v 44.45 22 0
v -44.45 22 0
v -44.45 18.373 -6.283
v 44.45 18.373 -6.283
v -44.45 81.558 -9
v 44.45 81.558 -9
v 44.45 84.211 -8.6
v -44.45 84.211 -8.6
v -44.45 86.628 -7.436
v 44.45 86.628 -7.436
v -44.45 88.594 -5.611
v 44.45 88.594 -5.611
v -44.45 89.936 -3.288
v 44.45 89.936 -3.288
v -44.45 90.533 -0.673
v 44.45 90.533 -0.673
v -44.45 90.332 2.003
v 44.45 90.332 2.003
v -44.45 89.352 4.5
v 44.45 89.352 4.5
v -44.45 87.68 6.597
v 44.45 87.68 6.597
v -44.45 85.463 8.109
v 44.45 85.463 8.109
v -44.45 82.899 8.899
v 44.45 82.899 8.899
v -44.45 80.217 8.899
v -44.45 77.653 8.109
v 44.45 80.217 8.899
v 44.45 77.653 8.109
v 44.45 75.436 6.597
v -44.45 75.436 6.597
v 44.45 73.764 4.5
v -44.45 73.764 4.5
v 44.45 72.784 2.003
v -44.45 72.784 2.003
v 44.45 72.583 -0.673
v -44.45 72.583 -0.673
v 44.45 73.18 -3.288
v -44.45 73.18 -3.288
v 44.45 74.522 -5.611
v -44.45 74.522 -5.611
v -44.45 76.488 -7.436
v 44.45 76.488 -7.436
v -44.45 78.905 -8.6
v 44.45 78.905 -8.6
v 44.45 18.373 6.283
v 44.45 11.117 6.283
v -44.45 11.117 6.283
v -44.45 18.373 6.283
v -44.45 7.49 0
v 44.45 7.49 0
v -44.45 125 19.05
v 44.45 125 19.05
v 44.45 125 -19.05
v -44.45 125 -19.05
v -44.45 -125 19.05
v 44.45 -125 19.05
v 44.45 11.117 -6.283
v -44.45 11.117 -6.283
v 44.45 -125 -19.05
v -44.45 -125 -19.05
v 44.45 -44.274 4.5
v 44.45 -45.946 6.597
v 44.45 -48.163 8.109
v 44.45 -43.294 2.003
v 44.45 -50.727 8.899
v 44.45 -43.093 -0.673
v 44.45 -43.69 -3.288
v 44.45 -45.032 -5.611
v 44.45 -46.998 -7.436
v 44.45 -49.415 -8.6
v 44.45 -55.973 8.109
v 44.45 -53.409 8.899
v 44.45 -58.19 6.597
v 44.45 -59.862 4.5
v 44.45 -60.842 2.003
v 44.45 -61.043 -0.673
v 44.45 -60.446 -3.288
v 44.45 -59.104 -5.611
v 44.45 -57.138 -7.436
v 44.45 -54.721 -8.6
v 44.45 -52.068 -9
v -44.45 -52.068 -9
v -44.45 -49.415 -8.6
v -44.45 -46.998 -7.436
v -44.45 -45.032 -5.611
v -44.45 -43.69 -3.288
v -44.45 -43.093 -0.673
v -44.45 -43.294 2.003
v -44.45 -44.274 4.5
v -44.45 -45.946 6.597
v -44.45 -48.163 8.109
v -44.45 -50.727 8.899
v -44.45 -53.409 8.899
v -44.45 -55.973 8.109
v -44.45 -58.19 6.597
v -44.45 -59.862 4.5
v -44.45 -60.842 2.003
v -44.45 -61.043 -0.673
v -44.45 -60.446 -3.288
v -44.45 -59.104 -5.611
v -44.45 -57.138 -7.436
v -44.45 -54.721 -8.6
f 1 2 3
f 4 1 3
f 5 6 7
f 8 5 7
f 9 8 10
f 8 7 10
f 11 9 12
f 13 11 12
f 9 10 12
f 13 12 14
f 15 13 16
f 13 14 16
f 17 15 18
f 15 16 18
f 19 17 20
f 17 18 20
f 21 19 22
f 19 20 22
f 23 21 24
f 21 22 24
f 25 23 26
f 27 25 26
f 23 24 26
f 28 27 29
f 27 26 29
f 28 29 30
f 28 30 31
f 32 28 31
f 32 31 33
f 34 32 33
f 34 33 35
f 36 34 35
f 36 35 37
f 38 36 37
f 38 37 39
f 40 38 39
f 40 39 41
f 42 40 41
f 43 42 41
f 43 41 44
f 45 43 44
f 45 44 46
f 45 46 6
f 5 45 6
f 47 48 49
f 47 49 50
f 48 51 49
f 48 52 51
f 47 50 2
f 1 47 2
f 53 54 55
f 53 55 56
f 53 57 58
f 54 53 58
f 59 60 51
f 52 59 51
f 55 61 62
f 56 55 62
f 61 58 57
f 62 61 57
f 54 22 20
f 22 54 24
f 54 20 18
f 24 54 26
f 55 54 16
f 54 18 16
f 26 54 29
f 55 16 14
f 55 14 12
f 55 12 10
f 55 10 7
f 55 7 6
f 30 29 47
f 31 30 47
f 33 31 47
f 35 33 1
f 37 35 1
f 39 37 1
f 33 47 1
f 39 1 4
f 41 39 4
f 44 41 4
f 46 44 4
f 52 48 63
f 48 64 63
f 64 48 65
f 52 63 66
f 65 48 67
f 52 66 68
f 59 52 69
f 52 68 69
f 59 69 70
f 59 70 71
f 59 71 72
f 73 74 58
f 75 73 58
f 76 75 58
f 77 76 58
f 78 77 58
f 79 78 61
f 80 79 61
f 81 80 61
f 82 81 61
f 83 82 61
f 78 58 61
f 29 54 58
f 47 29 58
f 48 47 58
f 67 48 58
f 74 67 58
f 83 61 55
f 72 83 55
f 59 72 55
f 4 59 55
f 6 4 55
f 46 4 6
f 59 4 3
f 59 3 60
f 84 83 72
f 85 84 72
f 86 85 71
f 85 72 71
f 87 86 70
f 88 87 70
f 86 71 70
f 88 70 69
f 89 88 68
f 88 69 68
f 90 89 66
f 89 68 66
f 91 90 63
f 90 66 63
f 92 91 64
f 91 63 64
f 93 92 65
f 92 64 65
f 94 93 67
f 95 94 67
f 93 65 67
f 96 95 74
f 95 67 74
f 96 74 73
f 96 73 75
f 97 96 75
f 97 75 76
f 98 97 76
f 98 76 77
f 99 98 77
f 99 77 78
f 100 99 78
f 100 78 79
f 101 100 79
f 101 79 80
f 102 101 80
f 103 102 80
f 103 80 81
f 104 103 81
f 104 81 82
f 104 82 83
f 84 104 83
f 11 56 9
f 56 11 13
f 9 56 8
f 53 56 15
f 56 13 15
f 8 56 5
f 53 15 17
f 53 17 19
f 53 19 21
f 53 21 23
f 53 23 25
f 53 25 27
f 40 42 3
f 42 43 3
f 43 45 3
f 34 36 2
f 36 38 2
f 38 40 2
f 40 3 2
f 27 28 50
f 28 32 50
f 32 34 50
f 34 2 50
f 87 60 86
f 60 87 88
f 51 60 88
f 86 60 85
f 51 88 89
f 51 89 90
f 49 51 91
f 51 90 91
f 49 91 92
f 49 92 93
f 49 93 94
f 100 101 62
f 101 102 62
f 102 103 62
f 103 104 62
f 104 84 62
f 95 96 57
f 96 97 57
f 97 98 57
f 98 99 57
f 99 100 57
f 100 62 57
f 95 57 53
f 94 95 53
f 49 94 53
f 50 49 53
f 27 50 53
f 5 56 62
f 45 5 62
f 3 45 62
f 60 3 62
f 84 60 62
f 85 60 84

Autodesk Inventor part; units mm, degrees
ref_plane "YZ Plane" through (0, 0, 0) normal (1, 0, 0) x (0, 1, 0)
ref_plane "XZ Plane" through (0, 0, 0) normal (0, 1, 0) x (-1, 0, 0)
ref_plane "XY Plane" through (0, 0, 0) normal (0, 0, 1) x (1, 0, 0)
sketch "Sketch4" plane through (0, 0, 0) normal (0, 1, 0) x (-1, 0, 0)
  line L0 (44.45, 19.05) -> (-44.45, 19.05)
  line L1 (-44.45, 19.05) -> (-44.45, -19.05)
  line L2 (-44.45, -19.05) -> (44.45, -19.05)
  line L3 (44.45, -19.05) -> (44.45, 19.05)
  line L4 (44.45, 19.05) -> (-44.45, -19.05) construction
  line L5 (-44.45, 19.05) -> (44.45, -19.05) construction
  point P0 (0, 0)
  dimension "d8" = 88.9
  dimension "d9" = 38.1
extrude "Extrusion2" add sketch "Sketch4" along normal mid plane 250
sketch "Sketch5" plane through (44.45, -125, -19.05) normal (1, 0, 0) x (0, 0, -1)
  circle A0 centre (-19.05, 206.558) radius 9
  circle A1 centre (-19.05, 72.932) radius 9
  line L0 (-38.1, 250) -> (0, 250) projected
  circle A2 centre (-19.05, 139.745) radius 7.2555
  line L1 (-19.05, 132.4895) -> (-25.3334, 136.1172)
  line L2 (-25.3334, 136.1172) -> (-25.3334, 143.3727)
  line L3 (-25.3334, 143.3727) -> (-19.05, 147.0005)
  line L4 (-19.05, 147.0005) -> (-12.7666, 143.3727)
  line L5 (-12.7666, 143.3727) -> (-12.7666, 136.1173)
  line L6 (-12.7666, 136.1173) -> (-19.05, 132.4895)
  point P0 (-19.05, 125)
  dimension "d40" = 14.511
  dimension "d12" = 18
  dimension "d14" = 18
  dimension "d37" = 43.442
  dimension "d38" = 66.813
  dimension "d39" = 133.626
  dimension "d41" = 66.813
extrude "Extrusion4" cut sketch "Sketch5" against normal blind 103.1875 contours A0 | A1 | L5 L6 L1 L2 L3 L4
properties part number "CNC-Y-axis- moving side to side plateform"
